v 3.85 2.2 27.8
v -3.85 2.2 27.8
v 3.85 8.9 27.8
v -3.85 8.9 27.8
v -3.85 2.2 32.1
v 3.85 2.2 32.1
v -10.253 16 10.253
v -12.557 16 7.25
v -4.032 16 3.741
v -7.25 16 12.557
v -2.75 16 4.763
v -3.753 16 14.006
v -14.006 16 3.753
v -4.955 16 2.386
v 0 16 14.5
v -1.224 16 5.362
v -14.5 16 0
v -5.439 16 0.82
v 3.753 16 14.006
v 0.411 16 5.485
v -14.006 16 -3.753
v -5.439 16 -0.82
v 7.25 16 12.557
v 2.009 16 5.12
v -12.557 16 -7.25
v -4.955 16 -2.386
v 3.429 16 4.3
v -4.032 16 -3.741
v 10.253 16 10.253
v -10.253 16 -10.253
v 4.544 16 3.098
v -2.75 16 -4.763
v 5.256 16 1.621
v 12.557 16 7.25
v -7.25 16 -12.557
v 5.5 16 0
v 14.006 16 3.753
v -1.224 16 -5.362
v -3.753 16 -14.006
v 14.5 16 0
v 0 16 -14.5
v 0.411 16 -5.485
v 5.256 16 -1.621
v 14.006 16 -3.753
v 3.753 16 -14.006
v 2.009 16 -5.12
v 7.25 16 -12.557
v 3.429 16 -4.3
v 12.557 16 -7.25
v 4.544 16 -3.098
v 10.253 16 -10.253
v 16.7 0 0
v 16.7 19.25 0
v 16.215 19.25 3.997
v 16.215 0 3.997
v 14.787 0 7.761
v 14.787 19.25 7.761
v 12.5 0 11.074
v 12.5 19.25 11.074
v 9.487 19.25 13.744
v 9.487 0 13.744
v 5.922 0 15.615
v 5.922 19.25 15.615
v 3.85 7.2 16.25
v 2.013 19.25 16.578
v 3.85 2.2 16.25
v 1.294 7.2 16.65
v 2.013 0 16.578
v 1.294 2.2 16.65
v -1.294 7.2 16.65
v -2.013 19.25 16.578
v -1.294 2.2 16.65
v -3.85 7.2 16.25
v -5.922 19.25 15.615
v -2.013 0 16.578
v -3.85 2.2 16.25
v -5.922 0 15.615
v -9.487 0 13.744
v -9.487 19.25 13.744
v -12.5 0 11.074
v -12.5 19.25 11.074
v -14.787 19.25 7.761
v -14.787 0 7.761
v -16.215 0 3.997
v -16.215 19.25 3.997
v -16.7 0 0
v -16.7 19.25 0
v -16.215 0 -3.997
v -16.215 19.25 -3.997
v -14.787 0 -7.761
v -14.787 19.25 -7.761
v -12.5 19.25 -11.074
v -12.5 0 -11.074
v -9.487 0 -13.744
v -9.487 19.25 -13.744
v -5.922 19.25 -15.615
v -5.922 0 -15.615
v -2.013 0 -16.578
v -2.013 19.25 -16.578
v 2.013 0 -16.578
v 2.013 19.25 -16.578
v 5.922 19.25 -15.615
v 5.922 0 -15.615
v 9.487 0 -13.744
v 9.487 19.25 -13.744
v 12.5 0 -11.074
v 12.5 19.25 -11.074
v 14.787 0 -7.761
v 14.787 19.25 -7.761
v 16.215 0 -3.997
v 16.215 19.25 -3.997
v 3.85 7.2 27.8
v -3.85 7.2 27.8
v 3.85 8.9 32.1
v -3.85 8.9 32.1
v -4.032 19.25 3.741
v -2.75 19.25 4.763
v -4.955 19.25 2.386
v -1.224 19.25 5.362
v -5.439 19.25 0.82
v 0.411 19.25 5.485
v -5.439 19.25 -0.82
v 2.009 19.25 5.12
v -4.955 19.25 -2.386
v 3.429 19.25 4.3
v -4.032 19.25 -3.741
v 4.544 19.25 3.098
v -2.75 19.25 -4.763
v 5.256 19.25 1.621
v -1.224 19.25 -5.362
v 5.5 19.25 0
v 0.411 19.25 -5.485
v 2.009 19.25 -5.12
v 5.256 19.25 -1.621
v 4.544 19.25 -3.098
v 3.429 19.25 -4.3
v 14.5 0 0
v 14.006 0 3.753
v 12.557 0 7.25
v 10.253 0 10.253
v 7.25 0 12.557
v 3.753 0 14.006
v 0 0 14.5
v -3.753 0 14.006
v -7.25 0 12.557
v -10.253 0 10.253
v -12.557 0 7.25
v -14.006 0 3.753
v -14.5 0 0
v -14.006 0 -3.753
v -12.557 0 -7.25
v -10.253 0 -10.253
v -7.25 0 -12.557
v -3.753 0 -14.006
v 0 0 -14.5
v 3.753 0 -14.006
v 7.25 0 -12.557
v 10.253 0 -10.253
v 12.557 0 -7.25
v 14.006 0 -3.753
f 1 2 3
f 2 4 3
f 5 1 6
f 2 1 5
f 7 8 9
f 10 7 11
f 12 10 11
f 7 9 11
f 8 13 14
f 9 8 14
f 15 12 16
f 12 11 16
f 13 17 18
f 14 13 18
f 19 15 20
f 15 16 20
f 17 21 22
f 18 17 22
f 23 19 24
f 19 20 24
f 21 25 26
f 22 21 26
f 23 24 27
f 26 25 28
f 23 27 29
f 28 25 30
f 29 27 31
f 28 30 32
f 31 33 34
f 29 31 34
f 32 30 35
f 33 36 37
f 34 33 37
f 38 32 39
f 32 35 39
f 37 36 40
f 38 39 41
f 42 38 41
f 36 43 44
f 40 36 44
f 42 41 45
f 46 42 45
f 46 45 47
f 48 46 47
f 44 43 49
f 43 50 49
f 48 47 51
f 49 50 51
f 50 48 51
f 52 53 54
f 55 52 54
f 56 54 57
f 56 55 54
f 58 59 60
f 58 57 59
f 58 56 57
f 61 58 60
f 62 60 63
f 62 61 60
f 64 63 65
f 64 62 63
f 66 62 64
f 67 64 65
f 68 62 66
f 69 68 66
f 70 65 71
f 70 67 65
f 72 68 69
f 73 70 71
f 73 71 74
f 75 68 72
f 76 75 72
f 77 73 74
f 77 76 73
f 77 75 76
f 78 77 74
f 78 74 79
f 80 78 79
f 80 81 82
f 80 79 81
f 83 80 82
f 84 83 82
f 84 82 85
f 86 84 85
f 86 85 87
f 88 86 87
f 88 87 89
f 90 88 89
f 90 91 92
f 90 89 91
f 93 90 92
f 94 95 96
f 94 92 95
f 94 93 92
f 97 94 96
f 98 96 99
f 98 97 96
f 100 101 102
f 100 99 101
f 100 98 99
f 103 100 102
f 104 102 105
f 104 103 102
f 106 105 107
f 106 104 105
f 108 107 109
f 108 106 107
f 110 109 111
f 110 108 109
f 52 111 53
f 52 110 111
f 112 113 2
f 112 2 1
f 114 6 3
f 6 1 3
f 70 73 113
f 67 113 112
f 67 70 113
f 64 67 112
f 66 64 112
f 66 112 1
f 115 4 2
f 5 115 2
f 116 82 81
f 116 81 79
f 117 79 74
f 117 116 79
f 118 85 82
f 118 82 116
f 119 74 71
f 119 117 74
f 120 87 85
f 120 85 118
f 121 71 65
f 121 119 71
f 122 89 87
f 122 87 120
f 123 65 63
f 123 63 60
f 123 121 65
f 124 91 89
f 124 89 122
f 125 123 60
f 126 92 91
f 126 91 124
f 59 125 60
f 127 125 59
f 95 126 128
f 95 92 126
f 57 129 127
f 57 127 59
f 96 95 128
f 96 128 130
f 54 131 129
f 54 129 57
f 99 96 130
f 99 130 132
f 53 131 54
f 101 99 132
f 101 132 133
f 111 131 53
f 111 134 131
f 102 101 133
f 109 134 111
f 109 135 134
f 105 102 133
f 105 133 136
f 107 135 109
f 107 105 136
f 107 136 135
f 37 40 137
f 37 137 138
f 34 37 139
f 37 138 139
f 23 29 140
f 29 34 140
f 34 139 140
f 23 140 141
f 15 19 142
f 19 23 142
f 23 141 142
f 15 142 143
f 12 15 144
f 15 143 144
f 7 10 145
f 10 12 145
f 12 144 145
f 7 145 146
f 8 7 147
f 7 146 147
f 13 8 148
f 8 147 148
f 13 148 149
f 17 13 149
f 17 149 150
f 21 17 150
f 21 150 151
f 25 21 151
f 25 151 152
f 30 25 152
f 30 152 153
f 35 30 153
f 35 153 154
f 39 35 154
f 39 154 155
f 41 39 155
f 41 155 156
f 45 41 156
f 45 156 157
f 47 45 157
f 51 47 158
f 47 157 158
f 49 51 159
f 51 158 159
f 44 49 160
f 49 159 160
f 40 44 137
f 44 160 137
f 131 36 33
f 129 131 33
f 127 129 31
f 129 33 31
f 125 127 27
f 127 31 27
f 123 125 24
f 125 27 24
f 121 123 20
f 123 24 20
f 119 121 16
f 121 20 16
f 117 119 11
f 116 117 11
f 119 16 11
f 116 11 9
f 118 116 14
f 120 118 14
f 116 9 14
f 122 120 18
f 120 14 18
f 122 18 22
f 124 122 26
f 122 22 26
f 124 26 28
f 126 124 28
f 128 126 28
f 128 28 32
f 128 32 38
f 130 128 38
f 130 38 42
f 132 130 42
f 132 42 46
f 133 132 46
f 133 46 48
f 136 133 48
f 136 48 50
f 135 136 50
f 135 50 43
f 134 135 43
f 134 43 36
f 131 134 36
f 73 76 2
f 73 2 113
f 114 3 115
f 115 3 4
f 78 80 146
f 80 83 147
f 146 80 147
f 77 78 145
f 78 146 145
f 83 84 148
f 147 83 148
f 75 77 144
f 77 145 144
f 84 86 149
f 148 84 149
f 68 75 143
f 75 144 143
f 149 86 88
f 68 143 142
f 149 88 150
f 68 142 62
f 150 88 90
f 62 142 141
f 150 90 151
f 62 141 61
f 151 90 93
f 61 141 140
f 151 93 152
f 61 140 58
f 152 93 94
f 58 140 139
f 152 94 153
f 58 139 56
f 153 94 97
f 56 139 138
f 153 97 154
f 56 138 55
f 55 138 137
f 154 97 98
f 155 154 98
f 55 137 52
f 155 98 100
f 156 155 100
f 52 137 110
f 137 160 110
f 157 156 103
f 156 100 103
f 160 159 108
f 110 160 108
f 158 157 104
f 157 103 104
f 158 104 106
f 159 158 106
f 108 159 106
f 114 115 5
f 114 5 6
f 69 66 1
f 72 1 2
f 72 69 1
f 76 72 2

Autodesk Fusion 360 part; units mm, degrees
sketch "Esboço1" plane through (0, 0, 0) normal (0, 1, 0) x (1, 0, 0)
  circle A0 centre (0, 0) radius 16.7
  circle A1 centre (0, 0) radius 14.5
  circle A2 centre (0, 0) radius 5.5
  dimension "d1" = 33.4
  dimension "d2" = 29
  dimension "d12" = 11
extrude "Extrusão1" add sketch "Esboço1" along normal blind 19.25 contours A0 | A1 | A2 makes body 1
extrude "Extrusão2" cut sketch "Esboço1" along normal blind 16 contours A1 | A2 bodies 1
sketch "Esboço2" plane through (0, 0, 0) normal (0, 0, 1) x (1, 0, 0)
  line L0 (0, 0) -> (-4.5, 0)
  line L1 (-3.85, 7.2) -> (3.85, 7.2)
  line L2 (3.85, 7.2) -> (3.85, 2.2)
  line L3 (3.85, 2.2) -> (-3.85, 2.2)
  line L4 (-3.85, 2.2) -> (-3.85, 7.2)
  line L5 (-3.85, 2.2) -> (3.85, 2.2)
  line L6 (3.85, 2.2) -> (3.85, 8.9)
  line L7 (3.85, 8.9) -> (-3.85, 8.9)
  line L8 (-3.85, 8.9) -> (-3.85, 2.2)
  dimension "d15" = 7.7
  dimension "d16" = 5
  dimension "d17" = 3.85
  dimension "d18" = 2.2
  dimension "d19" = 7.7
  dimension "d20" = 6.7
extrude "Extrusão4" cut sketch "Esboço1" along normal blind 22 contours A2 bodies 1
extrude "Extrusão6" add sketch "Esboço2" along normal blind 27.8 contours L1 L2 L3 L4 L5 L6 L8 bodies 1
extrude "Extrusão5" add sketch "Esboço2" along normal blind 4.3 from surface at 27.8 separate body makes body 2
extrude "Extrusão7" cut sketch "Esboço2" along normal up to surface end surface at (14.482, 10.6667, 0.7228) on bodies 1 bodies 1
